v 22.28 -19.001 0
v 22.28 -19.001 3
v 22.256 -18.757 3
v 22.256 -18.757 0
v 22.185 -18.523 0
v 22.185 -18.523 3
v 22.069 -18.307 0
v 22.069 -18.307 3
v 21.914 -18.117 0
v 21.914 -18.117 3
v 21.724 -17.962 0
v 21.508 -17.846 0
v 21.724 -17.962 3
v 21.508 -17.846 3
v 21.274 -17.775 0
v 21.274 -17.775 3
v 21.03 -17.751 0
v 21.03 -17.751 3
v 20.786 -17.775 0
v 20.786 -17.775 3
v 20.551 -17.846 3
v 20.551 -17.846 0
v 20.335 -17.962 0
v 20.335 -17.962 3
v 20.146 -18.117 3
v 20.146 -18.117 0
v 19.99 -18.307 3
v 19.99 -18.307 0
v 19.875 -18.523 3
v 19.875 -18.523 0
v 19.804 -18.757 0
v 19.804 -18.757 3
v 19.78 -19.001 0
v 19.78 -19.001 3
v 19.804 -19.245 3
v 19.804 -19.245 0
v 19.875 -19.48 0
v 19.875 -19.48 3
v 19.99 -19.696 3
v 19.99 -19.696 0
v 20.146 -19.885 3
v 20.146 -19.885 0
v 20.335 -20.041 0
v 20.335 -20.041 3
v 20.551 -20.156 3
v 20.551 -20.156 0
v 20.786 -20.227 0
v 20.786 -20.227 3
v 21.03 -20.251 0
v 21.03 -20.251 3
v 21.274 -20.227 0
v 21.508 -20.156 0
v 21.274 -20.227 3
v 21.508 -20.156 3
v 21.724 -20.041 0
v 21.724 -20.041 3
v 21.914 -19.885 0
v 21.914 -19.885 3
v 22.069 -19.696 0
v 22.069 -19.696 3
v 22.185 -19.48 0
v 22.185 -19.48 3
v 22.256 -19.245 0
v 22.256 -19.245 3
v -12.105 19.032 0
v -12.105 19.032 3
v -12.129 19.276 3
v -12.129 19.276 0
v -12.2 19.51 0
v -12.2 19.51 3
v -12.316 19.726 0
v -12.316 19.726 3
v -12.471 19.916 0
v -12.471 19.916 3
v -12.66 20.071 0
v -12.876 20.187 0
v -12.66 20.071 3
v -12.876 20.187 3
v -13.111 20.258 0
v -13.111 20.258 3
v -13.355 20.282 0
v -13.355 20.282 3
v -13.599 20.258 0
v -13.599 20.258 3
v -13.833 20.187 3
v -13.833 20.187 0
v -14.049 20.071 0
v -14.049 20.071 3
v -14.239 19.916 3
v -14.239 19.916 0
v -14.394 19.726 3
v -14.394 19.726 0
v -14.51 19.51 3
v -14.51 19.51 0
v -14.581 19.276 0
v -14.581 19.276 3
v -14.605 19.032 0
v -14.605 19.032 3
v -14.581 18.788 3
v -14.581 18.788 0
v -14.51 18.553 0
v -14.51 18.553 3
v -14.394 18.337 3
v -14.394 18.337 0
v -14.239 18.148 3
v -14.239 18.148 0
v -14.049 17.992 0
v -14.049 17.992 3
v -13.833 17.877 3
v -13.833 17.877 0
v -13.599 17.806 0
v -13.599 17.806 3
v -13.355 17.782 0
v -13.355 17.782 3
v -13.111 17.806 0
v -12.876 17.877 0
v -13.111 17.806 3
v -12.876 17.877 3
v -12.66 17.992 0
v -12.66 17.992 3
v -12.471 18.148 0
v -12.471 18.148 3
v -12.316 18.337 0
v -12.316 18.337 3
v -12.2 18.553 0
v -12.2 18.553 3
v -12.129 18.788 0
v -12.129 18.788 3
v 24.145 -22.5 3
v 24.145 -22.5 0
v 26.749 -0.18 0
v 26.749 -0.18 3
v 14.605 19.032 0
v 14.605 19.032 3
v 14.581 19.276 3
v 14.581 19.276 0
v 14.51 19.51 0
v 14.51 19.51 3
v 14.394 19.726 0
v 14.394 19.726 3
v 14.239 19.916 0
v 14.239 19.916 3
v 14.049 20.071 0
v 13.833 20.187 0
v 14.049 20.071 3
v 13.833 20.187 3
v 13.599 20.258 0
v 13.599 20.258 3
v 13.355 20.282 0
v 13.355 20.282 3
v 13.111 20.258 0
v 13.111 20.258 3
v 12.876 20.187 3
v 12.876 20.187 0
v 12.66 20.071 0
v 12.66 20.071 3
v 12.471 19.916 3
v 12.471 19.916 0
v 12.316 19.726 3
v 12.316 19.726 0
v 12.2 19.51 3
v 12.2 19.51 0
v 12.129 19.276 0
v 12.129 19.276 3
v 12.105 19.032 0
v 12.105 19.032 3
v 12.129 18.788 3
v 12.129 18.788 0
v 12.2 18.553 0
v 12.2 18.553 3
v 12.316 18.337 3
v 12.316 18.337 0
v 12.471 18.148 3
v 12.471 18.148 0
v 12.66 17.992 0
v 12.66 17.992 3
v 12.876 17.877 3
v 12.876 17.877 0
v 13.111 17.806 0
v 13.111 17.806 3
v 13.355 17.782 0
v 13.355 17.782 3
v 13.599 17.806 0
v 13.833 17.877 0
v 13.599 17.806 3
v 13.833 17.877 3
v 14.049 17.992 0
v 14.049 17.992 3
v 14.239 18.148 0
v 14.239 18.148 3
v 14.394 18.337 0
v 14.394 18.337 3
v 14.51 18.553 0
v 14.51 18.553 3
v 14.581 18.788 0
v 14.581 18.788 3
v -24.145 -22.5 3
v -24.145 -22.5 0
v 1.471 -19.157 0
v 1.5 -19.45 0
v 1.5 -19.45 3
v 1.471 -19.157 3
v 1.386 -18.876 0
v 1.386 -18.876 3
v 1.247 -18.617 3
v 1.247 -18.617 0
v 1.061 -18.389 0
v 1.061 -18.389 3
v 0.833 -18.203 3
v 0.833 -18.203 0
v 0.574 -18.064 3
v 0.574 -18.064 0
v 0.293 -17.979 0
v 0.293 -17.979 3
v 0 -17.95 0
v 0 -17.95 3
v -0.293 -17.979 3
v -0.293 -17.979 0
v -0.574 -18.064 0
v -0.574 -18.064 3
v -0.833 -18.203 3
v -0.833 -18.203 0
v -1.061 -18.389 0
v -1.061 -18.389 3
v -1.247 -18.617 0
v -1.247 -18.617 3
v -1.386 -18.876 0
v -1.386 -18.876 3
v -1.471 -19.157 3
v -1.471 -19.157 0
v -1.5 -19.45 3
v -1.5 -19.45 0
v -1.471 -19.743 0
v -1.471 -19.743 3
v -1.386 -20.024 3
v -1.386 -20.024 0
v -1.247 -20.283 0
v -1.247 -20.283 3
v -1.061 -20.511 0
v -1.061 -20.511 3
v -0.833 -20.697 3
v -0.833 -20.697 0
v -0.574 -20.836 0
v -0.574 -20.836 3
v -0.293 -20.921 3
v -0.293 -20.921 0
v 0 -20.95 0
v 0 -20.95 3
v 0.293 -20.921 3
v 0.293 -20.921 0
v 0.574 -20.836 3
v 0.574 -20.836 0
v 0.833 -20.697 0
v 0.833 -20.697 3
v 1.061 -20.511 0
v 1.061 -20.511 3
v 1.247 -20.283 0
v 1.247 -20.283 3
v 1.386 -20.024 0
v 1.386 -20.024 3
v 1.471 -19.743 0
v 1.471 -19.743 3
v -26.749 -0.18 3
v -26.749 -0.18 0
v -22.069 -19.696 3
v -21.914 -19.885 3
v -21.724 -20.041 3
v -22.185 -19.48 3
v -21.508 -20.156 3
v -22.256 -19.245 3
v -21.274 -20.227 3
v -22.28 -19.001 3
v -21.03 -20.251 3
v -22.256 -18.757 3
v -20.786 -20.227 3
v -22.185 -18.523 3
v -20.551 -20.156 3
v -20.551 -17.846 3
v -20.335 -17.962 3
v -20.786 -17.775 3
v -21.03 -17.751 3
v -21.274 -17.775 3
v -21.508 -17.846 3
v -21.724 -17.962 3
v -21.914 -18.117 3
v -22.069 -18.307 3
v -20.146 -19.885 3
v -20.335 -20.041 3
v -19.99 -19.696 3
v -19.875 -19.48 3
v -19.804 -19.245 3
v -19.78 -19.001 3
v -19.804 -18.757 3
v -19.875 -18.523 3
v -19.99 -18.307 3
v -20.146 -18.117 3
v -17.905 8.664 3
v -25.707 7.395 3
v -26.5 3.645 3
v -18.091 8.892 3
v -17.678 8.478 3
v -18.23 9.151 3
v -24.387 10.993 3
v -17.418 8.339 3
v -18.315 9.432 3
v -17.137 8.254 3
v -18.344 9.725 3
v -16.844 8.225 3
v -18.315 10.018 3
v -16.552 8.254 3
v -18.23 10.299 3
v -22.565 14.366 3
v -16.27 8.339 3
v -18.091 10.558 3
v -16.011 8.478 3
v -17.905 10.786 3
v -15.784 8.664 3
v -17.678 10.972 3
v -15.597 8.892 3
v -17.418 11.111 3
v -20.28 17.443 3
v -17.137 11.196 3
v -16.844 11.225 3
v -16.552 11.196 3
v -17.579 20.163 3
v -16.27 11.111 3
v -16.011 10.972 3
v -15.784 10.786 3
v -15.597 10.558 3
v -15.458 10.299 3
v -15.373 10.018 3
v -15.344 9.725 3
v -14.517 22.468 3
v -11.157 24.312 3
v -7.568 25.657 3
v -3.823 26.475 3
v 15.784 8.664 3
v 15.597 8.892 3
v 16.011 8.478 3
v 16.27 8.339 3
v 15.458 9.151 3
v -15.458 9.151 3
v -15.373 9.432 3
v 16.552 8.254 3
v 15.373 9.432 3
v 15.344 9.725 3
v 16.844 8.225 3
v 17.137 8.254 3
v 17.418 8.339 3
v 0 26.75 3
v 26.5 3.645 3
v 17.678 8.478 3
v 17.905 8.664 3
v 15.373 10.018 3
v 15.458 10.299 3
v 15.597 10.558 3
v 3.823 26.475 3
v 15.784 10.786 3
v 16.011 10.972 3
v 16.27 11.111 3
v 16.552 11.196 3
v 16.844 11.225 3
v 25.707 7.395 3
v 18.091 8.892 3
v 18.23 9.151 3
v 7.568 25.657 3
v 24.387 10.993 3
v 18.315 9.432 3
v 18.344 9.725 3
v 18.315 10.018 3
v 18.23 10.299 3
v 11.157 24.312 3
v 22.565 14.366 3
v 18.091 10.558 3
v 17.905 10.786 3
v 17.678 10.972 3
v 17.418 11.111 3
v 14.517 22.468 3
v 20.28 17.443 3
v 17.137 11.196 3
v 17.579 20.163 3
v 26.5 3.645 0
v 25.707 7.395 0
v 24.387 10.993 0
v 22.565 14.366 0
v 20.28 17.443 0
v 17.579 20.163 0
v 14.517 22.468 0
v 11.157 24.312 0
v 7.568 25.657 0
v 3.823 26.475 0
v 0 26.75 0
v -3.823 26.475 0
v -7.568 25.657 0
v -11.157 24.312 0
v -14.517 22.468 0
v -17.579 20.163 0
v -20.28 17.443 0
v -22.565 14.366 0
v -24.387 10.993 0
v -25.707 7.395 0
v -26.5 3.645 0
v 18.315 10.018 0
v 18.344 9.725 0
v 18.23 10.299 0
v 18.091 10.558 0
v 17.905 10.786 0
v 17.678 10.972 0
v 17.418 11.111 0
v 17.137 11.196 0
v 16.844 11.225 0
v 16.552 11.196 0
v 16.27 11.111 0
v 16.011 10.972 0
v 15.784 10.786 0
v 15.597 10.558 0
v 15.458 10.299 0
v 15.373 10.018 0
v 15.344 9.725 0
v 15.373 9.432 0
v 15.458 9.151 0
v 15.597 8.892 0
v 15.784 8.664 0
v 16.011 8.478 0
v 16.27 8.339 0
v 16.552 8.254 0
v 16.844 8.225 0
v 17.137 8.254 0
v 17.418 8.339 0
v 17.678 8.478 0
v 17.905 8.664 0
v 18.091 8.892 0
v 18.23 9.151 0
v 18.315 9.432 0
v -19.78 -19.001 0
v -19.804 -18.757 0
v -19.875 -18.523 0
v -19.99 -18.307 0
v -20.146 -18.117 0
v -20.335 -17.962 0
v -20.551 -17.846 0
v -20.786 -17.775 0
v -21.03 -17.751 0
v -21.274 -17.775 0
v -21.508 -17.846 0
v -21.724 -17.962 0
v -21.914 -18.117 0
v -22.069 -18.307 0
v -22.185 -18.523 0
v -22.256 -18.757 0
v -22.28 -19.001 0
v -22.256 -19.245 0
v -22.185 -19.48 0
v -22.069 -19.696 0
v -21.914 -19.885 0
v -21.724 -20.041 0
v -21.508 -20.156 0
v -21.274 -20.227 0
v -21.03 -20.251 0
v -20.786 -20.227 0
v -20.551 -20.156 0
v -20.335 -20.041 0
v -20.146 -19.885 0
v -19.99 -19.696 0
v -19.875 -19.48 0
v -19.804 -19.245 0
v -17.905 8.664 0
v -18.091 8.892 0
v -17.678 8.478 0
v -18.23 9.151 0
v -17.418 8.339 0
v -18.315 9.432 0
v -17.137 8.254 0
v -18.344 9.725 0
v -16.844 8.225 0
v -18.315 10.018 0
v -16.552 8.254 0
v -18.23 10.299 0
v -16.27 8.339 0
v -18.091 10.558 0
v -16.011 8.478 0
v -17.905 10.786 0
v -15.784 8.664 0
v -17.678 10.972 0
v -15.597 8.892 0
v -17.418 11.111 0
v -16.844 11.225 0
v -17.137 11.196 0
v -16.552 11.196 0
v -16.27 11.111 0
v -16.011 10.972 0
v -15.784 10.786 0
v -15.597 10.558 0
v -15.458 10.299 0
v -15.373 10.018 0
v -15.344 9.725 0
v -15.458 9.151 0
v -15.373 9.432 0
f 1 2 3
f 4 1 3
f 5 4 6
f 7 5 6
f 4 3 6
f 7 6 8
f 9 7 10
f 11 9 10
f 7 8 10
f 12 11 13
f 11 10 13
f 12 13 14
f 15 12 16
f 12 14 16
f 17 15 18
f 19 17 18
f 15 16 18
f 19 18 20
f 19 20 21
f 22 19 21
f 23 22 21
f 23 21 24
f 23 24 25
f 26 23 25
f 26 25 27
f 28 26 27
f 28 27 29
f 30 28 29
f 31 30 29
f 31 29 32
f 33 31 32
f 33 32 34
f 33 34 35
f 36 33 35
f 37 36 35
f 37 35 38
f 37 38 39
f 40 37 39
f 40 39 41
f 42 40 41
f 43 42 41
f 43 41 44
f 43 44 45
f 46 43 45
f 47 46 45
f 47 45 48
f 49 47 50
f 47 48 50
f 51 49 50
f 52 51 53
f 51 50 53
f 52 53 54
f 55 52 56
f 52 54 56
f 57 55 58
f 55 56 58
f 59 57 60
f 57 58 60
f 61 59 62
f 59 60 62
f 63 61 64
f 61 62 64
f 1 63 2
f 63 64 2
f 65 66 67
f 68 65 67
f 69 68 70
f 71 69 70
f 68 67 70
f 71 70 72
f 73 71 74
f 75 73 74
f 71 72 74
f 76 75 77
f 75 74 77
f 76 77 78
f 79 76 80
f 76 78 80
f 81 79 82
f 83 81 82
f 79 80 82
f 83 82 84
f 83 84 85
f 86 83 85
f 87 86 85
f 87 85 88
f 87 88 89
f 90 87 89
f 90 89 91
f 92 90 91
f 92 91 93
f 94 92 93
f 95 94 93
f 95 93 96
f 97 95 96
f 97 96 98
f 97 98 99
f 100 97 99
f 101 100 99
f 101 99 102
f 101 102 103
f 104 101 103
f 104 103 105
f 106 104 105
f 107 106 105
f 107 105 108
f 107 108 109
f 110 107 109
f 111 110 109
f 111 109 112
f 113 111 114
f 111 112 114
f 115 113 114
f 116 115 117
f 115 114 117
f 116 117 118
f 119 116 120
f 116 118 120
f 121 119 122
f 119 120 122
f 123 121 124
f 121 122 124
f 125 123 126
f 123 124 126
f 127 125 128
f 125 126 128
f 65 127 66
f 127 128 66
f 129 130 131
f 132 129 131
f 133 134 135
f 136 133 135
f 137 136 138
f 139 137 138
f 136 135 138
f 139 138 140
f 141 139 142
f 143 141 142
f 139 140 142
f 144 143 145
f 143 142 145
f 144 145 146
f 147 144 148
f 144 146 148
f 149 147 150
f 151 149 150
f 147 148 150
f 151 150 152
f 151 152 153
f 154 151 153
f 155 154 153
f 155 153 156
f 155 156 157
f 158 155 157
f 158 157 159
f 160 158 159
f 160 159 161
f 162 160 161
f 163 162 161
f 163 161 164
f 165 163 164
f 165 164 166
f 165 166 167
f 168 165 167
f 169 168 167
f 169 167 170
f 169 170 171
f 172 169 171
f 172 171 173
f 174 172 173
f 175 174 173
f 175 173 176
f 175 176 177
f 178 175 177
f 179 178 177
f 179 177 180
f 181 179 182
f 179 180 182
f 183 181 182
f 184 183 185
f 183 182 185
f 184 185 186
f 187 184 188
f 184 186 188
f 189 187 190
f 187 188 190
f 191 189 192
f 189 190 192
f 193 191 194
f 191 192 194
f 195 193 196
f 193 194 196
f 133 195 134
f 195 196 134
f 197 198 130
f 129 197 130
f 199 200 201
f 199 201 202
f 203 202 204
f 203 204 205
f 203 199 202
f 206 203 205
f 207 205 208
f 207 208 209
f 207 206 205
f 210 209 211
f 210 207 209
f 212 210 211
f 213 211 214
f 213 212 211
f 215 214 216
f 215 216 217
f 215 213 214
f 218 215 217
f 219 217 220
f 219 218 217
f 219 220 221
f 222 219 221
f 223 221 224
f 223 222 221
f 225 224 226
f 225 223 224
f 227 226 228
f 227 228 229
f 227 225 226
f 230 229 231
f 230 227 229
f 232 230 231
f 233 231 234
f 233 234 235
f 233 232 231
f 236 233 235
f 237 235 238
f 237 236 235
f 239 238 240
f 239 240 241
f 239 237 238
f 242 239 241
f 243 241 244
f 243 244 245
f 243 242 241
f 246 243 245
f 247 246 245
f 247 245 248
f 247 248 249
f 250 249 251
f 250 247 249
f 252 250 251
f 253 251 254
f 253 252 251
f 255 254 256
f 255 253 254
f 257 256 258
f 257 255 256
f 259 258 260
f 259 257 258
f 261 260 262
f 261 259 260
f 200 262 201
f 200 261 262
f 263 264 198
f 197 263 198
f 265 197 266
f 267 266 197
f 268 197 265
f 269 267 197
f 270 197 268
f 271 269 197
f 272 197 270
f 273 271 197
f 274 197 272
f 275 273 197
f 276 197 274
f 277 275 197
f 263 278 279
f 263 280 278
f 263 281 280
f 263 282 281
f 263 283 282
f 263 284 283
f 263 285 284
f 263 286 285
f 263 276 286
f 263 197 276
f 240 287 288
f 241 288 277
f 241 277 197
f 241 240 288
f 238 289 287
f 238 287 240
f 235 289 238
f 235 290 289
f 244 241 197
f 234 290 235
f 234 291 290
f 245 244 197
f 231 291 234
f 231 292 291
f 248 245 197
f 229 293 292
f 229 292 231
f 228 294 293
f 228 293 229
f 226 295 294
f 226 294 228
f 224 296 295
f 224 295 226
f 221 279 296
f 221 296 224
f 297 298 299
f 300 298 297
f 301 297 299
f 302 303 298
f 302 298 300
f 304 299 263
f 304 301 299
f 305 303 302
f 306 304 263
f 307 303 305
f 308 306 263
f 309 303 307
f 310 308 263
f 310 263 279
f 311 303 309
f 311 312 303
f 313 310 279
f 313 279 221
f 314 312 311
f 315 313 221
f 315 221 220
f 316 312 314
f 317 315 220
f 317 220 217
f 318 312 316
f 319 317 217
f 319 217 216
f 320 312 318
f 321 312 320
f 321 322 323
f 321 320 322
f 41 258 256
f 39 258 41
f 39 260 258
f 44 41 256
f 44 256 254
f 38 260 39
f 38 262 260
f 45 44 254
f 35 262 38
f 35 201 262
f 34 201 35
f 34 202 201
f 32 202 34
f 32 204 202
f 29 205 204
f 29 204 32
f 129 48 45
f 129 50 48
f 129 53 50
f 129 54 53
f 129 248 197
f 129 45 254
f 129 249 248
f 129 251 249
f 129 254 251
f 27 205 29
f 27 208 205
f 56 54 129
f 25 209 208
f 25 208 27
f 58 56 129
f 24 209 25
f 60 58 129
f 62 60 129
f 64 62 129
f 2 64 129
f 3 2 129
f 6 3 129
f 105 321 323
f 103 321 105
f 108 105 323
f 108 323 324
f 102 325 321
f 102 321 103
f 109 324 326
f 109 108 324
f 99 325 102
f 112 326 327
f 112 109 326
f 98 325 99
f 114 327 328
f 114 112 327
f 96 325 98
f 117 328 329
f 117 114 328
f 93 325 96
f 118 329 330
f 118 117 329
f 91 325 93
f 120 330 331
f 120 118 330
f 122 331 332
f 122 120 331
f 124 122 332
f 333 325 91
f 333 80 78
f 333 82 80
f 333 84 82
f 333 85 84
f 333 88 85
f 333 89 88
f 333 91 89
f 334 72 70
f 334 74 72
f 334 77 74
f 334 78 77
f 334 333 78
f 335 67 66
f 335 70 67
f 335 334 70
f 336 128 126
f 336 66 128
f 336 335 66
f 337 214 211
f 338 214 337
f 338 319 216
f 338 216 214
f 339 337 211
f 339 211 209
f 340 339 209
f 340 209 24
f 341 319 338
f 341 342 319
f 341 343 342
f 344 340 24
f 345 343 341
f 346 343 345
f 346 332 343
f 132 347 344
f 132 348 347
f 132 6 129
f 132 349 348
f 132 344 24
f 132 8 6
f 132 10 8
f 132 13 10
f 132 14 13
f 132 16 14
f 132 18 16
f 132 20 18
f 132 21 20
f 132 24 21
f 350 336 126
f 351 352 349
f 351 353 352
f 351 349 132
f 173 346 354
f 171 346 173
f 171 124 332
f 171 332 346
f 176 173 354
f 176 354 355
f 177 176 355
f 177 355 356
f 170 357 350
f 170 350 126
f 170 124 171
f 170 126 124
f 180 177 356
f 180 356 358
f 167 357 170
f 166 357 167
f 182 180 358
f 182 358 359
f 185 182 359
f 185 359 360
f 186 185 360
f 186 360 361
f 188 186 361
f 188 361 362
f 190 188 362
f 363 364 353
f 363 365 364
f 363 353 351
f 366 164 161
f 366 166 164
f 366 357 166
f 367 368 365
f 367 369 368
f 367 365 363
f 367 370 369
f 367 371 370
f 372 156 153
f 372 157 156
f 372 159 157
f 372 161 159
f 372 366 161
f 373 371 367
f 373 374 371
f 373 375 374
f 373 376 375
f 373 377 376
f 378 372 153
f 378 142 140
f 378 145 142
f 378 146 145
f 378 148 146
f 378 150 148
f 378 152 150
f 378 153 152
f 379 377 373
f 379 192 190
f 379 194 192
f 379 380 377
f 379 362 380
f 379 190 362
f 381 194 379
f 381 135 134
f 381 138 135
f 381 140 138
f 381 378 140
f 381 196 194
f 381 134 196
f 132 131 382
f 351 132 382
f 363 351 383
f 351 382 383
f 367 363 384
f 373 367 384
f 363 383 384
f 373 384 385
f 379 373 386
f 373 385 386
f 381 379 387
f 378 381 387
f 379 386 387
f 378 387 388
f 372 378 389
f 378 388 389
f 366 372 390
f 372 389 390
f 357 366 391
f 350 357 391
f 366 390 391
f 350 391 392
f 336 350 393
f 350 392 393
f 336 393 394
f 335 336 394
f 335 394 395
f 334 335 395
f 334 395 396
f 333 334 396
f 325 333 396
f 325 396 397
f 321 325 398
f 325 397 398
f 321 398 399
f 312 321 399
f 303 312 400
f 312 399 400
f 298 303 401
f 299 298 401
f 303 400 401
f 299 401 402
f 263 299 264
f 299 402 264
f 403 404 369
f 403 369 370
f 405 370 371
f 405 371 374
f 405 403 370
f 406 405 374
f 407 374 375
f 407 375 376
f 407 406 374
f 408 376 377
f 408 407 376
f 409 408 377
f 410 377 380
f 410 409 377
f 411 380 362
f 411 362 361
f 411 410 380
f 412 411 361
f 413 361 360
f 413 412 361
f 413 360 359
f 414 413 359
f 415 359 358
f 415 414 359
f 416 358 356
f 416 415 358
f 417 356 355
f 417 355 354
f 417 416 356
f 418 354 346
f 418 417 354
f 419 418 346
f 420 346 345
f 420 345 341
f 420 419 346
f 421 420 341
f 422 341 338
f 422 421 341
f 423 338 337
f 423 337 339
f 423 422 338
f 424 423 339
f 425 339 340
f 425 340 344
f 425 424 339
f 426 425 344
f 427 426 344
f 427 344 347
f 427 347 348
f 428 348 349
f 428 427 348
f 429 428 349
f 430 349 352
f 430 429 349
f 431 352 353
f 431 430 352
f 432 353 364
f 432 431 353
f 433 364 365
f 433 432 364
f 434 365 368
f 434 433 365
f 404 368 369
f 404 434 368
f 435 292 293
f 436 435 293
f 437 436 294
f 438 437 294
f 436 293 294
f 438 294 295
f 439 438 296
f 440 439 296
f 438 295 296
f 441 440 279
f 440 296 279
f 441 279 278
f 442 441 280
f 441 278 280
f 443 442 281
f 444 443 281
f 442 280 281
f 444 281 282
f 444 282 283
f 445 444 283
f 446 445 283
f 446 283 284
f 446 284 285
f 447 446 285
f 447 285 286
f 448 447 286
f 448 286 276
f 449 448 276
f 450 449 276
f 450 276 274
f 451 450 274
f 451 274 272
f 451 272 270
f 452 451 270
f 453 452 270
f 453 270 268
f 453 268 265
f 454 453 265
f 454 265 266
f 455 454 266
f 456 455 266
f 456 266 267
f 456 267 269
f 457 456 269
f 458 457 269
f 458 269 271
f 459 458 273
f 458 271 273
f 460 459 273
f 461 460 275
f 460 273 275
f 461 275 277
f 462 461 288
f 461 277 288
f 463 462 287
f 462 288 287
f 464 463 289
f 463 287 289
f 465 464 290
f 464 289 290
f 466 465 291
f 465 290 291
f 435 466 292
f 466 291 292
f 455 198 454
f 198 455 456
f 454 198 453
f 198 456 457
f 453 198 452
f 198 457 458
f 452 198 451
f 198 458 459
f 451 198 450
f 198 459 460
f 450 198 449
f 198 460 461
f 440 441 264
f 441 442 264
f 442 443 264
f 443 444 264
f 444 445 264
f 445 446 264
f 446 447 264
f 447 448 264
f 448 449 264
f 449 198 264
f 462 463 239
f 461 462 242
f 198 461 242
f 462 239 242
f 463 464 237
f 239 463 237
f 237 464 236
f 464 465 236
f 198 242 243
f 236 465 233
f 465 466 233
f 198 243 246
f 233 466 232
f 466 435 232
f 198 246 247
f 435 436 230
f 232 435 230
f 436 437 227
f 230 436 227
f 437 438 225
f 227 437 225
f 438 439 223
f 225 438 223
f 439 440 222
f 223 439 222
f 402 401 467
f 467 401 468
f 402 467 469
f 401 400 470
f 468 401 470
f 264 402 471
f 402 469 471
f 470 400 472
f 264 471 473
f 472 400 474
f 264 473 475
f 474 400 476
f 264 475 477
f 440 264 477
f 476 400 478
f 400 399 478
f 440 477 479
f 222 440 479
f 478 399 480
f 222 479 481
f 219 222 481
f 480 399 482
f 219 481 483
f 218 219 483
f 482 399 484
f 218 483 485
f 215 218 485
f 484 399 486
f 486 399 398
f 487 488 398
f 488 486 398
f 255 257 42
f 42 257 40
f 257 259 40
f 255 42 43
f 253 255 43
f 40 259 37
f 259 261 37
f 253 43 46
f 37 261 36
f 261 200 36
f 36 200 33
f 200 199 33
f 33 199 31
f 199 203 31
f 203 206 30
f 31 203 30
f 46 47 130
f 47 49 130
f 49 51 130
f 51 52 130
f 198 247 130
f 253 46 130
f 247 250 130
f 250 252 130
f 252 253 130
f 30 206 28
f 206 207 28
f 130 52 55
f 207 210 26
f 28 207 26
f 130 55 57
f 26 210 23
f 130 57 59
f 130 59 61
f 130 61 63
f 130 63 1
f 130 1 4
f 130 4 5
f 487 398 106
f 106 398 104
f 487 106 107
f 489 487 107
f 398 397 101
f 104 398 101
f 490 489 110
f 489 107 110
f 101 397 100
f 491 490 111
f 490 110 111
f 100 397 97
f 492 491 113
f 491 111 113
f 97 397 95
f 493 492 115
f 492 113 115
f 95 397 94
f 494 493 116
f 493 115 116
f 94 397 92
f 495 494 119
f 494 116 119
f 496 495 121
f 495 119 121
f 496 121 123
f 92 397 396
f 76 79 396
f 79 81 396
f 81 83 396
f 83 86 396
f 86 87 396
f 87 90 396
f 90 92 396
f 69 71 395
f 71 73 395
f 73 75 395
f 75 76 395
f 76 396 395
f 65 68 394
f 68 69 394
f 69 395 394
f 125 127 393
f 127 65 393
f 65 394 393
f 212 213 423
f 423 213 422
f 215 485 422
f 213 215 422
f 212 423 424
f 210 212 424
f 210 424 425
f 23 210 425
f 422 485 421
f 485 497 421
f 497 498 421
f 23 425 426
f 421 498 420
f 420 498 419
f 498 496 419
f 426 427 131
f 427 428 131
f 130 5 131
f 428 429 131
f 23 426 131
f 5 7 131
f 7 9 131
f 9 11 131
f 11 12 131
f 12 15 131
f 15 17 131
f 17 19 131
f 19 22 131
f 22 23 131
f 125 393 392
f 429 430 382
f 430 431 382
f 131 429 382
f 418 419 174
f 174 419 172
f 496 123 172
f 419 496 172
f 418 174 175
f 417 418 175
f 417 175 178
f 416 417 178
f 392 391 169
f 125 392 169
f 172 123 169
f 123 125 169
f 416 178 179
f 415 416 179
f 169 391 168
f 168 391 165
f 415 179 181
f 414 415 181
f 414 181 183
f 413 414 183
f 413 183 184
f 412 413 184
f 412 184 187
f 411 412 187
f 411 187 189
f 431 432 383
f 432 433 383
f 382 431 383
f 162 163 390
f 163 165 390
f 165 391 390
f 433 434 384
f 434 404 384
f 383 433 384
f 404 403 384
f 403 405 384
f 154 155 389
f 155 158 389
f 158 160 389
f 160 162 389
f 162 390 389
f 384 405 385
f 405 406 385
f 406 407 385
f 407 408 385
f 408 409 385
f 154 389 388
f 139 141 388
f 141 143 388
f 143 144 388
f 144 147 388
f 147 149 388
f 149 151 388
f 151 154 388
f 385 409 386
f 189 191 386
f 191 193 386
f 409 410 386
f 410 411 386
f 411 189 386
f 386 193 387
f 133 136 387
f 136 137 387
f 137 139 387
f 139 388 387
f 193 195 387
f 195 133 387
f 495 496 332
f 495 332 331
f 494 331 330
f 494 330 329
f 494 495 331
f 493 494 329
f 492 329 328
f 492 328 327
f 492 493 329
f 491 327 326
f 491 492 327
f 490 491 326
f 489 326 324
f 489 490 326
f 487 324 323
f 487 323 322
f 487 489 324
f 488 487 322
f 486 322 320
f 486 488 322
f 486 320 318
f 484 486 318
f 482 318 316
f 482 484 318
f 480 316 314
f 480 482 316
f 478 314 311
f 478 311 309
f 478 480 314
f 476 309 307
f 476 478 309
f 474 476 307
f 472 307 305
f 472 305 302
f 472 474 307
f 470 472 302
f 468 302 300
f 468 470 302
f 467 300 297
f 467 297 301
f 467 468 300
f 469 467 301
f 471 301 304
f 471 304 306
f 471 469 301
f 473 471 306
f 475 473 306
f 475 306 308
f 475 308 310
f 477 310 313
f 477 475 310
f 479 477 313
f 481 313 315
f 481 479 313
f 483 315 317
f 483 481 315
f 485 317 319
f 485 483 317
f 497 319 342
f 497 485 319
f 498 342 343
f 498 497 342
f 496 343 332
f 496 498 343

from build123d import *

# Parameters (mm, degrees)
ESQUISSE1_R             = 1.5
BOSS_EXTRU_1_DEPTH      = 3
ESQUISSE2_R             = 1.25
ENL_V_MAT_EXTRU_2_DEPTH = 10


with BuildPart() as part:
    # Esquisse1 → Boss.-Extru.1 (new body)
    with BuildSketch(Plane.XY):
        with BuildLine():
            Line((-26.749397242, -0.17957503), (-24.145347662, -22.5))
            Line((-24.145347662, -22.5), (24.145347662, -22.5))
            Line((24.145347662, -22.5), (26.749397242, -0.17957503))
            ThreePointArc((26.749397242, -0.17957503), (0, 26.75), (-26.749397242, -0.17957503))
        make_face()
        with Locations((0, -19.45)):
            Circle(ESQUISSE1_R, mode=Mode.SUBTRACT)
        with Locations((-16.844194104, 9.725)):
            Circle(ESQUISSE1_R, mode=Mode.SUBTRACT)
        with Locations((16.844194104, 9.725)):
            Circle(ESQUISSE1_R, mode=Mode.SUBTRACT)
    extrude(amount=BOSS_EXTRU_1_DEPTH)

    # Esquisse2 → Enlèv. mat.-Extru.2 (cut)
    with BuildSketch(Plane.XY.offset(3)):
        with Locations((21.029790949, -19.001295206)):
            Circle(ESQUISSE2_R)
        with Locations((13.354846659, 19.031830461)):
            Circle(ESQUISSE2_R)
        with Locations((-13.354846659, 19.031830461)):
            Circle(ESQUISSE2_R)
        with Locations((-21.029790949, -19.001295206)):
            Circle(ESQUISSE2_R)
    extrude(amount=-ENL_V_MAT_EXTRU_2_DEPTH, mode=Mode.SUBTRACT)


solid = part.part
